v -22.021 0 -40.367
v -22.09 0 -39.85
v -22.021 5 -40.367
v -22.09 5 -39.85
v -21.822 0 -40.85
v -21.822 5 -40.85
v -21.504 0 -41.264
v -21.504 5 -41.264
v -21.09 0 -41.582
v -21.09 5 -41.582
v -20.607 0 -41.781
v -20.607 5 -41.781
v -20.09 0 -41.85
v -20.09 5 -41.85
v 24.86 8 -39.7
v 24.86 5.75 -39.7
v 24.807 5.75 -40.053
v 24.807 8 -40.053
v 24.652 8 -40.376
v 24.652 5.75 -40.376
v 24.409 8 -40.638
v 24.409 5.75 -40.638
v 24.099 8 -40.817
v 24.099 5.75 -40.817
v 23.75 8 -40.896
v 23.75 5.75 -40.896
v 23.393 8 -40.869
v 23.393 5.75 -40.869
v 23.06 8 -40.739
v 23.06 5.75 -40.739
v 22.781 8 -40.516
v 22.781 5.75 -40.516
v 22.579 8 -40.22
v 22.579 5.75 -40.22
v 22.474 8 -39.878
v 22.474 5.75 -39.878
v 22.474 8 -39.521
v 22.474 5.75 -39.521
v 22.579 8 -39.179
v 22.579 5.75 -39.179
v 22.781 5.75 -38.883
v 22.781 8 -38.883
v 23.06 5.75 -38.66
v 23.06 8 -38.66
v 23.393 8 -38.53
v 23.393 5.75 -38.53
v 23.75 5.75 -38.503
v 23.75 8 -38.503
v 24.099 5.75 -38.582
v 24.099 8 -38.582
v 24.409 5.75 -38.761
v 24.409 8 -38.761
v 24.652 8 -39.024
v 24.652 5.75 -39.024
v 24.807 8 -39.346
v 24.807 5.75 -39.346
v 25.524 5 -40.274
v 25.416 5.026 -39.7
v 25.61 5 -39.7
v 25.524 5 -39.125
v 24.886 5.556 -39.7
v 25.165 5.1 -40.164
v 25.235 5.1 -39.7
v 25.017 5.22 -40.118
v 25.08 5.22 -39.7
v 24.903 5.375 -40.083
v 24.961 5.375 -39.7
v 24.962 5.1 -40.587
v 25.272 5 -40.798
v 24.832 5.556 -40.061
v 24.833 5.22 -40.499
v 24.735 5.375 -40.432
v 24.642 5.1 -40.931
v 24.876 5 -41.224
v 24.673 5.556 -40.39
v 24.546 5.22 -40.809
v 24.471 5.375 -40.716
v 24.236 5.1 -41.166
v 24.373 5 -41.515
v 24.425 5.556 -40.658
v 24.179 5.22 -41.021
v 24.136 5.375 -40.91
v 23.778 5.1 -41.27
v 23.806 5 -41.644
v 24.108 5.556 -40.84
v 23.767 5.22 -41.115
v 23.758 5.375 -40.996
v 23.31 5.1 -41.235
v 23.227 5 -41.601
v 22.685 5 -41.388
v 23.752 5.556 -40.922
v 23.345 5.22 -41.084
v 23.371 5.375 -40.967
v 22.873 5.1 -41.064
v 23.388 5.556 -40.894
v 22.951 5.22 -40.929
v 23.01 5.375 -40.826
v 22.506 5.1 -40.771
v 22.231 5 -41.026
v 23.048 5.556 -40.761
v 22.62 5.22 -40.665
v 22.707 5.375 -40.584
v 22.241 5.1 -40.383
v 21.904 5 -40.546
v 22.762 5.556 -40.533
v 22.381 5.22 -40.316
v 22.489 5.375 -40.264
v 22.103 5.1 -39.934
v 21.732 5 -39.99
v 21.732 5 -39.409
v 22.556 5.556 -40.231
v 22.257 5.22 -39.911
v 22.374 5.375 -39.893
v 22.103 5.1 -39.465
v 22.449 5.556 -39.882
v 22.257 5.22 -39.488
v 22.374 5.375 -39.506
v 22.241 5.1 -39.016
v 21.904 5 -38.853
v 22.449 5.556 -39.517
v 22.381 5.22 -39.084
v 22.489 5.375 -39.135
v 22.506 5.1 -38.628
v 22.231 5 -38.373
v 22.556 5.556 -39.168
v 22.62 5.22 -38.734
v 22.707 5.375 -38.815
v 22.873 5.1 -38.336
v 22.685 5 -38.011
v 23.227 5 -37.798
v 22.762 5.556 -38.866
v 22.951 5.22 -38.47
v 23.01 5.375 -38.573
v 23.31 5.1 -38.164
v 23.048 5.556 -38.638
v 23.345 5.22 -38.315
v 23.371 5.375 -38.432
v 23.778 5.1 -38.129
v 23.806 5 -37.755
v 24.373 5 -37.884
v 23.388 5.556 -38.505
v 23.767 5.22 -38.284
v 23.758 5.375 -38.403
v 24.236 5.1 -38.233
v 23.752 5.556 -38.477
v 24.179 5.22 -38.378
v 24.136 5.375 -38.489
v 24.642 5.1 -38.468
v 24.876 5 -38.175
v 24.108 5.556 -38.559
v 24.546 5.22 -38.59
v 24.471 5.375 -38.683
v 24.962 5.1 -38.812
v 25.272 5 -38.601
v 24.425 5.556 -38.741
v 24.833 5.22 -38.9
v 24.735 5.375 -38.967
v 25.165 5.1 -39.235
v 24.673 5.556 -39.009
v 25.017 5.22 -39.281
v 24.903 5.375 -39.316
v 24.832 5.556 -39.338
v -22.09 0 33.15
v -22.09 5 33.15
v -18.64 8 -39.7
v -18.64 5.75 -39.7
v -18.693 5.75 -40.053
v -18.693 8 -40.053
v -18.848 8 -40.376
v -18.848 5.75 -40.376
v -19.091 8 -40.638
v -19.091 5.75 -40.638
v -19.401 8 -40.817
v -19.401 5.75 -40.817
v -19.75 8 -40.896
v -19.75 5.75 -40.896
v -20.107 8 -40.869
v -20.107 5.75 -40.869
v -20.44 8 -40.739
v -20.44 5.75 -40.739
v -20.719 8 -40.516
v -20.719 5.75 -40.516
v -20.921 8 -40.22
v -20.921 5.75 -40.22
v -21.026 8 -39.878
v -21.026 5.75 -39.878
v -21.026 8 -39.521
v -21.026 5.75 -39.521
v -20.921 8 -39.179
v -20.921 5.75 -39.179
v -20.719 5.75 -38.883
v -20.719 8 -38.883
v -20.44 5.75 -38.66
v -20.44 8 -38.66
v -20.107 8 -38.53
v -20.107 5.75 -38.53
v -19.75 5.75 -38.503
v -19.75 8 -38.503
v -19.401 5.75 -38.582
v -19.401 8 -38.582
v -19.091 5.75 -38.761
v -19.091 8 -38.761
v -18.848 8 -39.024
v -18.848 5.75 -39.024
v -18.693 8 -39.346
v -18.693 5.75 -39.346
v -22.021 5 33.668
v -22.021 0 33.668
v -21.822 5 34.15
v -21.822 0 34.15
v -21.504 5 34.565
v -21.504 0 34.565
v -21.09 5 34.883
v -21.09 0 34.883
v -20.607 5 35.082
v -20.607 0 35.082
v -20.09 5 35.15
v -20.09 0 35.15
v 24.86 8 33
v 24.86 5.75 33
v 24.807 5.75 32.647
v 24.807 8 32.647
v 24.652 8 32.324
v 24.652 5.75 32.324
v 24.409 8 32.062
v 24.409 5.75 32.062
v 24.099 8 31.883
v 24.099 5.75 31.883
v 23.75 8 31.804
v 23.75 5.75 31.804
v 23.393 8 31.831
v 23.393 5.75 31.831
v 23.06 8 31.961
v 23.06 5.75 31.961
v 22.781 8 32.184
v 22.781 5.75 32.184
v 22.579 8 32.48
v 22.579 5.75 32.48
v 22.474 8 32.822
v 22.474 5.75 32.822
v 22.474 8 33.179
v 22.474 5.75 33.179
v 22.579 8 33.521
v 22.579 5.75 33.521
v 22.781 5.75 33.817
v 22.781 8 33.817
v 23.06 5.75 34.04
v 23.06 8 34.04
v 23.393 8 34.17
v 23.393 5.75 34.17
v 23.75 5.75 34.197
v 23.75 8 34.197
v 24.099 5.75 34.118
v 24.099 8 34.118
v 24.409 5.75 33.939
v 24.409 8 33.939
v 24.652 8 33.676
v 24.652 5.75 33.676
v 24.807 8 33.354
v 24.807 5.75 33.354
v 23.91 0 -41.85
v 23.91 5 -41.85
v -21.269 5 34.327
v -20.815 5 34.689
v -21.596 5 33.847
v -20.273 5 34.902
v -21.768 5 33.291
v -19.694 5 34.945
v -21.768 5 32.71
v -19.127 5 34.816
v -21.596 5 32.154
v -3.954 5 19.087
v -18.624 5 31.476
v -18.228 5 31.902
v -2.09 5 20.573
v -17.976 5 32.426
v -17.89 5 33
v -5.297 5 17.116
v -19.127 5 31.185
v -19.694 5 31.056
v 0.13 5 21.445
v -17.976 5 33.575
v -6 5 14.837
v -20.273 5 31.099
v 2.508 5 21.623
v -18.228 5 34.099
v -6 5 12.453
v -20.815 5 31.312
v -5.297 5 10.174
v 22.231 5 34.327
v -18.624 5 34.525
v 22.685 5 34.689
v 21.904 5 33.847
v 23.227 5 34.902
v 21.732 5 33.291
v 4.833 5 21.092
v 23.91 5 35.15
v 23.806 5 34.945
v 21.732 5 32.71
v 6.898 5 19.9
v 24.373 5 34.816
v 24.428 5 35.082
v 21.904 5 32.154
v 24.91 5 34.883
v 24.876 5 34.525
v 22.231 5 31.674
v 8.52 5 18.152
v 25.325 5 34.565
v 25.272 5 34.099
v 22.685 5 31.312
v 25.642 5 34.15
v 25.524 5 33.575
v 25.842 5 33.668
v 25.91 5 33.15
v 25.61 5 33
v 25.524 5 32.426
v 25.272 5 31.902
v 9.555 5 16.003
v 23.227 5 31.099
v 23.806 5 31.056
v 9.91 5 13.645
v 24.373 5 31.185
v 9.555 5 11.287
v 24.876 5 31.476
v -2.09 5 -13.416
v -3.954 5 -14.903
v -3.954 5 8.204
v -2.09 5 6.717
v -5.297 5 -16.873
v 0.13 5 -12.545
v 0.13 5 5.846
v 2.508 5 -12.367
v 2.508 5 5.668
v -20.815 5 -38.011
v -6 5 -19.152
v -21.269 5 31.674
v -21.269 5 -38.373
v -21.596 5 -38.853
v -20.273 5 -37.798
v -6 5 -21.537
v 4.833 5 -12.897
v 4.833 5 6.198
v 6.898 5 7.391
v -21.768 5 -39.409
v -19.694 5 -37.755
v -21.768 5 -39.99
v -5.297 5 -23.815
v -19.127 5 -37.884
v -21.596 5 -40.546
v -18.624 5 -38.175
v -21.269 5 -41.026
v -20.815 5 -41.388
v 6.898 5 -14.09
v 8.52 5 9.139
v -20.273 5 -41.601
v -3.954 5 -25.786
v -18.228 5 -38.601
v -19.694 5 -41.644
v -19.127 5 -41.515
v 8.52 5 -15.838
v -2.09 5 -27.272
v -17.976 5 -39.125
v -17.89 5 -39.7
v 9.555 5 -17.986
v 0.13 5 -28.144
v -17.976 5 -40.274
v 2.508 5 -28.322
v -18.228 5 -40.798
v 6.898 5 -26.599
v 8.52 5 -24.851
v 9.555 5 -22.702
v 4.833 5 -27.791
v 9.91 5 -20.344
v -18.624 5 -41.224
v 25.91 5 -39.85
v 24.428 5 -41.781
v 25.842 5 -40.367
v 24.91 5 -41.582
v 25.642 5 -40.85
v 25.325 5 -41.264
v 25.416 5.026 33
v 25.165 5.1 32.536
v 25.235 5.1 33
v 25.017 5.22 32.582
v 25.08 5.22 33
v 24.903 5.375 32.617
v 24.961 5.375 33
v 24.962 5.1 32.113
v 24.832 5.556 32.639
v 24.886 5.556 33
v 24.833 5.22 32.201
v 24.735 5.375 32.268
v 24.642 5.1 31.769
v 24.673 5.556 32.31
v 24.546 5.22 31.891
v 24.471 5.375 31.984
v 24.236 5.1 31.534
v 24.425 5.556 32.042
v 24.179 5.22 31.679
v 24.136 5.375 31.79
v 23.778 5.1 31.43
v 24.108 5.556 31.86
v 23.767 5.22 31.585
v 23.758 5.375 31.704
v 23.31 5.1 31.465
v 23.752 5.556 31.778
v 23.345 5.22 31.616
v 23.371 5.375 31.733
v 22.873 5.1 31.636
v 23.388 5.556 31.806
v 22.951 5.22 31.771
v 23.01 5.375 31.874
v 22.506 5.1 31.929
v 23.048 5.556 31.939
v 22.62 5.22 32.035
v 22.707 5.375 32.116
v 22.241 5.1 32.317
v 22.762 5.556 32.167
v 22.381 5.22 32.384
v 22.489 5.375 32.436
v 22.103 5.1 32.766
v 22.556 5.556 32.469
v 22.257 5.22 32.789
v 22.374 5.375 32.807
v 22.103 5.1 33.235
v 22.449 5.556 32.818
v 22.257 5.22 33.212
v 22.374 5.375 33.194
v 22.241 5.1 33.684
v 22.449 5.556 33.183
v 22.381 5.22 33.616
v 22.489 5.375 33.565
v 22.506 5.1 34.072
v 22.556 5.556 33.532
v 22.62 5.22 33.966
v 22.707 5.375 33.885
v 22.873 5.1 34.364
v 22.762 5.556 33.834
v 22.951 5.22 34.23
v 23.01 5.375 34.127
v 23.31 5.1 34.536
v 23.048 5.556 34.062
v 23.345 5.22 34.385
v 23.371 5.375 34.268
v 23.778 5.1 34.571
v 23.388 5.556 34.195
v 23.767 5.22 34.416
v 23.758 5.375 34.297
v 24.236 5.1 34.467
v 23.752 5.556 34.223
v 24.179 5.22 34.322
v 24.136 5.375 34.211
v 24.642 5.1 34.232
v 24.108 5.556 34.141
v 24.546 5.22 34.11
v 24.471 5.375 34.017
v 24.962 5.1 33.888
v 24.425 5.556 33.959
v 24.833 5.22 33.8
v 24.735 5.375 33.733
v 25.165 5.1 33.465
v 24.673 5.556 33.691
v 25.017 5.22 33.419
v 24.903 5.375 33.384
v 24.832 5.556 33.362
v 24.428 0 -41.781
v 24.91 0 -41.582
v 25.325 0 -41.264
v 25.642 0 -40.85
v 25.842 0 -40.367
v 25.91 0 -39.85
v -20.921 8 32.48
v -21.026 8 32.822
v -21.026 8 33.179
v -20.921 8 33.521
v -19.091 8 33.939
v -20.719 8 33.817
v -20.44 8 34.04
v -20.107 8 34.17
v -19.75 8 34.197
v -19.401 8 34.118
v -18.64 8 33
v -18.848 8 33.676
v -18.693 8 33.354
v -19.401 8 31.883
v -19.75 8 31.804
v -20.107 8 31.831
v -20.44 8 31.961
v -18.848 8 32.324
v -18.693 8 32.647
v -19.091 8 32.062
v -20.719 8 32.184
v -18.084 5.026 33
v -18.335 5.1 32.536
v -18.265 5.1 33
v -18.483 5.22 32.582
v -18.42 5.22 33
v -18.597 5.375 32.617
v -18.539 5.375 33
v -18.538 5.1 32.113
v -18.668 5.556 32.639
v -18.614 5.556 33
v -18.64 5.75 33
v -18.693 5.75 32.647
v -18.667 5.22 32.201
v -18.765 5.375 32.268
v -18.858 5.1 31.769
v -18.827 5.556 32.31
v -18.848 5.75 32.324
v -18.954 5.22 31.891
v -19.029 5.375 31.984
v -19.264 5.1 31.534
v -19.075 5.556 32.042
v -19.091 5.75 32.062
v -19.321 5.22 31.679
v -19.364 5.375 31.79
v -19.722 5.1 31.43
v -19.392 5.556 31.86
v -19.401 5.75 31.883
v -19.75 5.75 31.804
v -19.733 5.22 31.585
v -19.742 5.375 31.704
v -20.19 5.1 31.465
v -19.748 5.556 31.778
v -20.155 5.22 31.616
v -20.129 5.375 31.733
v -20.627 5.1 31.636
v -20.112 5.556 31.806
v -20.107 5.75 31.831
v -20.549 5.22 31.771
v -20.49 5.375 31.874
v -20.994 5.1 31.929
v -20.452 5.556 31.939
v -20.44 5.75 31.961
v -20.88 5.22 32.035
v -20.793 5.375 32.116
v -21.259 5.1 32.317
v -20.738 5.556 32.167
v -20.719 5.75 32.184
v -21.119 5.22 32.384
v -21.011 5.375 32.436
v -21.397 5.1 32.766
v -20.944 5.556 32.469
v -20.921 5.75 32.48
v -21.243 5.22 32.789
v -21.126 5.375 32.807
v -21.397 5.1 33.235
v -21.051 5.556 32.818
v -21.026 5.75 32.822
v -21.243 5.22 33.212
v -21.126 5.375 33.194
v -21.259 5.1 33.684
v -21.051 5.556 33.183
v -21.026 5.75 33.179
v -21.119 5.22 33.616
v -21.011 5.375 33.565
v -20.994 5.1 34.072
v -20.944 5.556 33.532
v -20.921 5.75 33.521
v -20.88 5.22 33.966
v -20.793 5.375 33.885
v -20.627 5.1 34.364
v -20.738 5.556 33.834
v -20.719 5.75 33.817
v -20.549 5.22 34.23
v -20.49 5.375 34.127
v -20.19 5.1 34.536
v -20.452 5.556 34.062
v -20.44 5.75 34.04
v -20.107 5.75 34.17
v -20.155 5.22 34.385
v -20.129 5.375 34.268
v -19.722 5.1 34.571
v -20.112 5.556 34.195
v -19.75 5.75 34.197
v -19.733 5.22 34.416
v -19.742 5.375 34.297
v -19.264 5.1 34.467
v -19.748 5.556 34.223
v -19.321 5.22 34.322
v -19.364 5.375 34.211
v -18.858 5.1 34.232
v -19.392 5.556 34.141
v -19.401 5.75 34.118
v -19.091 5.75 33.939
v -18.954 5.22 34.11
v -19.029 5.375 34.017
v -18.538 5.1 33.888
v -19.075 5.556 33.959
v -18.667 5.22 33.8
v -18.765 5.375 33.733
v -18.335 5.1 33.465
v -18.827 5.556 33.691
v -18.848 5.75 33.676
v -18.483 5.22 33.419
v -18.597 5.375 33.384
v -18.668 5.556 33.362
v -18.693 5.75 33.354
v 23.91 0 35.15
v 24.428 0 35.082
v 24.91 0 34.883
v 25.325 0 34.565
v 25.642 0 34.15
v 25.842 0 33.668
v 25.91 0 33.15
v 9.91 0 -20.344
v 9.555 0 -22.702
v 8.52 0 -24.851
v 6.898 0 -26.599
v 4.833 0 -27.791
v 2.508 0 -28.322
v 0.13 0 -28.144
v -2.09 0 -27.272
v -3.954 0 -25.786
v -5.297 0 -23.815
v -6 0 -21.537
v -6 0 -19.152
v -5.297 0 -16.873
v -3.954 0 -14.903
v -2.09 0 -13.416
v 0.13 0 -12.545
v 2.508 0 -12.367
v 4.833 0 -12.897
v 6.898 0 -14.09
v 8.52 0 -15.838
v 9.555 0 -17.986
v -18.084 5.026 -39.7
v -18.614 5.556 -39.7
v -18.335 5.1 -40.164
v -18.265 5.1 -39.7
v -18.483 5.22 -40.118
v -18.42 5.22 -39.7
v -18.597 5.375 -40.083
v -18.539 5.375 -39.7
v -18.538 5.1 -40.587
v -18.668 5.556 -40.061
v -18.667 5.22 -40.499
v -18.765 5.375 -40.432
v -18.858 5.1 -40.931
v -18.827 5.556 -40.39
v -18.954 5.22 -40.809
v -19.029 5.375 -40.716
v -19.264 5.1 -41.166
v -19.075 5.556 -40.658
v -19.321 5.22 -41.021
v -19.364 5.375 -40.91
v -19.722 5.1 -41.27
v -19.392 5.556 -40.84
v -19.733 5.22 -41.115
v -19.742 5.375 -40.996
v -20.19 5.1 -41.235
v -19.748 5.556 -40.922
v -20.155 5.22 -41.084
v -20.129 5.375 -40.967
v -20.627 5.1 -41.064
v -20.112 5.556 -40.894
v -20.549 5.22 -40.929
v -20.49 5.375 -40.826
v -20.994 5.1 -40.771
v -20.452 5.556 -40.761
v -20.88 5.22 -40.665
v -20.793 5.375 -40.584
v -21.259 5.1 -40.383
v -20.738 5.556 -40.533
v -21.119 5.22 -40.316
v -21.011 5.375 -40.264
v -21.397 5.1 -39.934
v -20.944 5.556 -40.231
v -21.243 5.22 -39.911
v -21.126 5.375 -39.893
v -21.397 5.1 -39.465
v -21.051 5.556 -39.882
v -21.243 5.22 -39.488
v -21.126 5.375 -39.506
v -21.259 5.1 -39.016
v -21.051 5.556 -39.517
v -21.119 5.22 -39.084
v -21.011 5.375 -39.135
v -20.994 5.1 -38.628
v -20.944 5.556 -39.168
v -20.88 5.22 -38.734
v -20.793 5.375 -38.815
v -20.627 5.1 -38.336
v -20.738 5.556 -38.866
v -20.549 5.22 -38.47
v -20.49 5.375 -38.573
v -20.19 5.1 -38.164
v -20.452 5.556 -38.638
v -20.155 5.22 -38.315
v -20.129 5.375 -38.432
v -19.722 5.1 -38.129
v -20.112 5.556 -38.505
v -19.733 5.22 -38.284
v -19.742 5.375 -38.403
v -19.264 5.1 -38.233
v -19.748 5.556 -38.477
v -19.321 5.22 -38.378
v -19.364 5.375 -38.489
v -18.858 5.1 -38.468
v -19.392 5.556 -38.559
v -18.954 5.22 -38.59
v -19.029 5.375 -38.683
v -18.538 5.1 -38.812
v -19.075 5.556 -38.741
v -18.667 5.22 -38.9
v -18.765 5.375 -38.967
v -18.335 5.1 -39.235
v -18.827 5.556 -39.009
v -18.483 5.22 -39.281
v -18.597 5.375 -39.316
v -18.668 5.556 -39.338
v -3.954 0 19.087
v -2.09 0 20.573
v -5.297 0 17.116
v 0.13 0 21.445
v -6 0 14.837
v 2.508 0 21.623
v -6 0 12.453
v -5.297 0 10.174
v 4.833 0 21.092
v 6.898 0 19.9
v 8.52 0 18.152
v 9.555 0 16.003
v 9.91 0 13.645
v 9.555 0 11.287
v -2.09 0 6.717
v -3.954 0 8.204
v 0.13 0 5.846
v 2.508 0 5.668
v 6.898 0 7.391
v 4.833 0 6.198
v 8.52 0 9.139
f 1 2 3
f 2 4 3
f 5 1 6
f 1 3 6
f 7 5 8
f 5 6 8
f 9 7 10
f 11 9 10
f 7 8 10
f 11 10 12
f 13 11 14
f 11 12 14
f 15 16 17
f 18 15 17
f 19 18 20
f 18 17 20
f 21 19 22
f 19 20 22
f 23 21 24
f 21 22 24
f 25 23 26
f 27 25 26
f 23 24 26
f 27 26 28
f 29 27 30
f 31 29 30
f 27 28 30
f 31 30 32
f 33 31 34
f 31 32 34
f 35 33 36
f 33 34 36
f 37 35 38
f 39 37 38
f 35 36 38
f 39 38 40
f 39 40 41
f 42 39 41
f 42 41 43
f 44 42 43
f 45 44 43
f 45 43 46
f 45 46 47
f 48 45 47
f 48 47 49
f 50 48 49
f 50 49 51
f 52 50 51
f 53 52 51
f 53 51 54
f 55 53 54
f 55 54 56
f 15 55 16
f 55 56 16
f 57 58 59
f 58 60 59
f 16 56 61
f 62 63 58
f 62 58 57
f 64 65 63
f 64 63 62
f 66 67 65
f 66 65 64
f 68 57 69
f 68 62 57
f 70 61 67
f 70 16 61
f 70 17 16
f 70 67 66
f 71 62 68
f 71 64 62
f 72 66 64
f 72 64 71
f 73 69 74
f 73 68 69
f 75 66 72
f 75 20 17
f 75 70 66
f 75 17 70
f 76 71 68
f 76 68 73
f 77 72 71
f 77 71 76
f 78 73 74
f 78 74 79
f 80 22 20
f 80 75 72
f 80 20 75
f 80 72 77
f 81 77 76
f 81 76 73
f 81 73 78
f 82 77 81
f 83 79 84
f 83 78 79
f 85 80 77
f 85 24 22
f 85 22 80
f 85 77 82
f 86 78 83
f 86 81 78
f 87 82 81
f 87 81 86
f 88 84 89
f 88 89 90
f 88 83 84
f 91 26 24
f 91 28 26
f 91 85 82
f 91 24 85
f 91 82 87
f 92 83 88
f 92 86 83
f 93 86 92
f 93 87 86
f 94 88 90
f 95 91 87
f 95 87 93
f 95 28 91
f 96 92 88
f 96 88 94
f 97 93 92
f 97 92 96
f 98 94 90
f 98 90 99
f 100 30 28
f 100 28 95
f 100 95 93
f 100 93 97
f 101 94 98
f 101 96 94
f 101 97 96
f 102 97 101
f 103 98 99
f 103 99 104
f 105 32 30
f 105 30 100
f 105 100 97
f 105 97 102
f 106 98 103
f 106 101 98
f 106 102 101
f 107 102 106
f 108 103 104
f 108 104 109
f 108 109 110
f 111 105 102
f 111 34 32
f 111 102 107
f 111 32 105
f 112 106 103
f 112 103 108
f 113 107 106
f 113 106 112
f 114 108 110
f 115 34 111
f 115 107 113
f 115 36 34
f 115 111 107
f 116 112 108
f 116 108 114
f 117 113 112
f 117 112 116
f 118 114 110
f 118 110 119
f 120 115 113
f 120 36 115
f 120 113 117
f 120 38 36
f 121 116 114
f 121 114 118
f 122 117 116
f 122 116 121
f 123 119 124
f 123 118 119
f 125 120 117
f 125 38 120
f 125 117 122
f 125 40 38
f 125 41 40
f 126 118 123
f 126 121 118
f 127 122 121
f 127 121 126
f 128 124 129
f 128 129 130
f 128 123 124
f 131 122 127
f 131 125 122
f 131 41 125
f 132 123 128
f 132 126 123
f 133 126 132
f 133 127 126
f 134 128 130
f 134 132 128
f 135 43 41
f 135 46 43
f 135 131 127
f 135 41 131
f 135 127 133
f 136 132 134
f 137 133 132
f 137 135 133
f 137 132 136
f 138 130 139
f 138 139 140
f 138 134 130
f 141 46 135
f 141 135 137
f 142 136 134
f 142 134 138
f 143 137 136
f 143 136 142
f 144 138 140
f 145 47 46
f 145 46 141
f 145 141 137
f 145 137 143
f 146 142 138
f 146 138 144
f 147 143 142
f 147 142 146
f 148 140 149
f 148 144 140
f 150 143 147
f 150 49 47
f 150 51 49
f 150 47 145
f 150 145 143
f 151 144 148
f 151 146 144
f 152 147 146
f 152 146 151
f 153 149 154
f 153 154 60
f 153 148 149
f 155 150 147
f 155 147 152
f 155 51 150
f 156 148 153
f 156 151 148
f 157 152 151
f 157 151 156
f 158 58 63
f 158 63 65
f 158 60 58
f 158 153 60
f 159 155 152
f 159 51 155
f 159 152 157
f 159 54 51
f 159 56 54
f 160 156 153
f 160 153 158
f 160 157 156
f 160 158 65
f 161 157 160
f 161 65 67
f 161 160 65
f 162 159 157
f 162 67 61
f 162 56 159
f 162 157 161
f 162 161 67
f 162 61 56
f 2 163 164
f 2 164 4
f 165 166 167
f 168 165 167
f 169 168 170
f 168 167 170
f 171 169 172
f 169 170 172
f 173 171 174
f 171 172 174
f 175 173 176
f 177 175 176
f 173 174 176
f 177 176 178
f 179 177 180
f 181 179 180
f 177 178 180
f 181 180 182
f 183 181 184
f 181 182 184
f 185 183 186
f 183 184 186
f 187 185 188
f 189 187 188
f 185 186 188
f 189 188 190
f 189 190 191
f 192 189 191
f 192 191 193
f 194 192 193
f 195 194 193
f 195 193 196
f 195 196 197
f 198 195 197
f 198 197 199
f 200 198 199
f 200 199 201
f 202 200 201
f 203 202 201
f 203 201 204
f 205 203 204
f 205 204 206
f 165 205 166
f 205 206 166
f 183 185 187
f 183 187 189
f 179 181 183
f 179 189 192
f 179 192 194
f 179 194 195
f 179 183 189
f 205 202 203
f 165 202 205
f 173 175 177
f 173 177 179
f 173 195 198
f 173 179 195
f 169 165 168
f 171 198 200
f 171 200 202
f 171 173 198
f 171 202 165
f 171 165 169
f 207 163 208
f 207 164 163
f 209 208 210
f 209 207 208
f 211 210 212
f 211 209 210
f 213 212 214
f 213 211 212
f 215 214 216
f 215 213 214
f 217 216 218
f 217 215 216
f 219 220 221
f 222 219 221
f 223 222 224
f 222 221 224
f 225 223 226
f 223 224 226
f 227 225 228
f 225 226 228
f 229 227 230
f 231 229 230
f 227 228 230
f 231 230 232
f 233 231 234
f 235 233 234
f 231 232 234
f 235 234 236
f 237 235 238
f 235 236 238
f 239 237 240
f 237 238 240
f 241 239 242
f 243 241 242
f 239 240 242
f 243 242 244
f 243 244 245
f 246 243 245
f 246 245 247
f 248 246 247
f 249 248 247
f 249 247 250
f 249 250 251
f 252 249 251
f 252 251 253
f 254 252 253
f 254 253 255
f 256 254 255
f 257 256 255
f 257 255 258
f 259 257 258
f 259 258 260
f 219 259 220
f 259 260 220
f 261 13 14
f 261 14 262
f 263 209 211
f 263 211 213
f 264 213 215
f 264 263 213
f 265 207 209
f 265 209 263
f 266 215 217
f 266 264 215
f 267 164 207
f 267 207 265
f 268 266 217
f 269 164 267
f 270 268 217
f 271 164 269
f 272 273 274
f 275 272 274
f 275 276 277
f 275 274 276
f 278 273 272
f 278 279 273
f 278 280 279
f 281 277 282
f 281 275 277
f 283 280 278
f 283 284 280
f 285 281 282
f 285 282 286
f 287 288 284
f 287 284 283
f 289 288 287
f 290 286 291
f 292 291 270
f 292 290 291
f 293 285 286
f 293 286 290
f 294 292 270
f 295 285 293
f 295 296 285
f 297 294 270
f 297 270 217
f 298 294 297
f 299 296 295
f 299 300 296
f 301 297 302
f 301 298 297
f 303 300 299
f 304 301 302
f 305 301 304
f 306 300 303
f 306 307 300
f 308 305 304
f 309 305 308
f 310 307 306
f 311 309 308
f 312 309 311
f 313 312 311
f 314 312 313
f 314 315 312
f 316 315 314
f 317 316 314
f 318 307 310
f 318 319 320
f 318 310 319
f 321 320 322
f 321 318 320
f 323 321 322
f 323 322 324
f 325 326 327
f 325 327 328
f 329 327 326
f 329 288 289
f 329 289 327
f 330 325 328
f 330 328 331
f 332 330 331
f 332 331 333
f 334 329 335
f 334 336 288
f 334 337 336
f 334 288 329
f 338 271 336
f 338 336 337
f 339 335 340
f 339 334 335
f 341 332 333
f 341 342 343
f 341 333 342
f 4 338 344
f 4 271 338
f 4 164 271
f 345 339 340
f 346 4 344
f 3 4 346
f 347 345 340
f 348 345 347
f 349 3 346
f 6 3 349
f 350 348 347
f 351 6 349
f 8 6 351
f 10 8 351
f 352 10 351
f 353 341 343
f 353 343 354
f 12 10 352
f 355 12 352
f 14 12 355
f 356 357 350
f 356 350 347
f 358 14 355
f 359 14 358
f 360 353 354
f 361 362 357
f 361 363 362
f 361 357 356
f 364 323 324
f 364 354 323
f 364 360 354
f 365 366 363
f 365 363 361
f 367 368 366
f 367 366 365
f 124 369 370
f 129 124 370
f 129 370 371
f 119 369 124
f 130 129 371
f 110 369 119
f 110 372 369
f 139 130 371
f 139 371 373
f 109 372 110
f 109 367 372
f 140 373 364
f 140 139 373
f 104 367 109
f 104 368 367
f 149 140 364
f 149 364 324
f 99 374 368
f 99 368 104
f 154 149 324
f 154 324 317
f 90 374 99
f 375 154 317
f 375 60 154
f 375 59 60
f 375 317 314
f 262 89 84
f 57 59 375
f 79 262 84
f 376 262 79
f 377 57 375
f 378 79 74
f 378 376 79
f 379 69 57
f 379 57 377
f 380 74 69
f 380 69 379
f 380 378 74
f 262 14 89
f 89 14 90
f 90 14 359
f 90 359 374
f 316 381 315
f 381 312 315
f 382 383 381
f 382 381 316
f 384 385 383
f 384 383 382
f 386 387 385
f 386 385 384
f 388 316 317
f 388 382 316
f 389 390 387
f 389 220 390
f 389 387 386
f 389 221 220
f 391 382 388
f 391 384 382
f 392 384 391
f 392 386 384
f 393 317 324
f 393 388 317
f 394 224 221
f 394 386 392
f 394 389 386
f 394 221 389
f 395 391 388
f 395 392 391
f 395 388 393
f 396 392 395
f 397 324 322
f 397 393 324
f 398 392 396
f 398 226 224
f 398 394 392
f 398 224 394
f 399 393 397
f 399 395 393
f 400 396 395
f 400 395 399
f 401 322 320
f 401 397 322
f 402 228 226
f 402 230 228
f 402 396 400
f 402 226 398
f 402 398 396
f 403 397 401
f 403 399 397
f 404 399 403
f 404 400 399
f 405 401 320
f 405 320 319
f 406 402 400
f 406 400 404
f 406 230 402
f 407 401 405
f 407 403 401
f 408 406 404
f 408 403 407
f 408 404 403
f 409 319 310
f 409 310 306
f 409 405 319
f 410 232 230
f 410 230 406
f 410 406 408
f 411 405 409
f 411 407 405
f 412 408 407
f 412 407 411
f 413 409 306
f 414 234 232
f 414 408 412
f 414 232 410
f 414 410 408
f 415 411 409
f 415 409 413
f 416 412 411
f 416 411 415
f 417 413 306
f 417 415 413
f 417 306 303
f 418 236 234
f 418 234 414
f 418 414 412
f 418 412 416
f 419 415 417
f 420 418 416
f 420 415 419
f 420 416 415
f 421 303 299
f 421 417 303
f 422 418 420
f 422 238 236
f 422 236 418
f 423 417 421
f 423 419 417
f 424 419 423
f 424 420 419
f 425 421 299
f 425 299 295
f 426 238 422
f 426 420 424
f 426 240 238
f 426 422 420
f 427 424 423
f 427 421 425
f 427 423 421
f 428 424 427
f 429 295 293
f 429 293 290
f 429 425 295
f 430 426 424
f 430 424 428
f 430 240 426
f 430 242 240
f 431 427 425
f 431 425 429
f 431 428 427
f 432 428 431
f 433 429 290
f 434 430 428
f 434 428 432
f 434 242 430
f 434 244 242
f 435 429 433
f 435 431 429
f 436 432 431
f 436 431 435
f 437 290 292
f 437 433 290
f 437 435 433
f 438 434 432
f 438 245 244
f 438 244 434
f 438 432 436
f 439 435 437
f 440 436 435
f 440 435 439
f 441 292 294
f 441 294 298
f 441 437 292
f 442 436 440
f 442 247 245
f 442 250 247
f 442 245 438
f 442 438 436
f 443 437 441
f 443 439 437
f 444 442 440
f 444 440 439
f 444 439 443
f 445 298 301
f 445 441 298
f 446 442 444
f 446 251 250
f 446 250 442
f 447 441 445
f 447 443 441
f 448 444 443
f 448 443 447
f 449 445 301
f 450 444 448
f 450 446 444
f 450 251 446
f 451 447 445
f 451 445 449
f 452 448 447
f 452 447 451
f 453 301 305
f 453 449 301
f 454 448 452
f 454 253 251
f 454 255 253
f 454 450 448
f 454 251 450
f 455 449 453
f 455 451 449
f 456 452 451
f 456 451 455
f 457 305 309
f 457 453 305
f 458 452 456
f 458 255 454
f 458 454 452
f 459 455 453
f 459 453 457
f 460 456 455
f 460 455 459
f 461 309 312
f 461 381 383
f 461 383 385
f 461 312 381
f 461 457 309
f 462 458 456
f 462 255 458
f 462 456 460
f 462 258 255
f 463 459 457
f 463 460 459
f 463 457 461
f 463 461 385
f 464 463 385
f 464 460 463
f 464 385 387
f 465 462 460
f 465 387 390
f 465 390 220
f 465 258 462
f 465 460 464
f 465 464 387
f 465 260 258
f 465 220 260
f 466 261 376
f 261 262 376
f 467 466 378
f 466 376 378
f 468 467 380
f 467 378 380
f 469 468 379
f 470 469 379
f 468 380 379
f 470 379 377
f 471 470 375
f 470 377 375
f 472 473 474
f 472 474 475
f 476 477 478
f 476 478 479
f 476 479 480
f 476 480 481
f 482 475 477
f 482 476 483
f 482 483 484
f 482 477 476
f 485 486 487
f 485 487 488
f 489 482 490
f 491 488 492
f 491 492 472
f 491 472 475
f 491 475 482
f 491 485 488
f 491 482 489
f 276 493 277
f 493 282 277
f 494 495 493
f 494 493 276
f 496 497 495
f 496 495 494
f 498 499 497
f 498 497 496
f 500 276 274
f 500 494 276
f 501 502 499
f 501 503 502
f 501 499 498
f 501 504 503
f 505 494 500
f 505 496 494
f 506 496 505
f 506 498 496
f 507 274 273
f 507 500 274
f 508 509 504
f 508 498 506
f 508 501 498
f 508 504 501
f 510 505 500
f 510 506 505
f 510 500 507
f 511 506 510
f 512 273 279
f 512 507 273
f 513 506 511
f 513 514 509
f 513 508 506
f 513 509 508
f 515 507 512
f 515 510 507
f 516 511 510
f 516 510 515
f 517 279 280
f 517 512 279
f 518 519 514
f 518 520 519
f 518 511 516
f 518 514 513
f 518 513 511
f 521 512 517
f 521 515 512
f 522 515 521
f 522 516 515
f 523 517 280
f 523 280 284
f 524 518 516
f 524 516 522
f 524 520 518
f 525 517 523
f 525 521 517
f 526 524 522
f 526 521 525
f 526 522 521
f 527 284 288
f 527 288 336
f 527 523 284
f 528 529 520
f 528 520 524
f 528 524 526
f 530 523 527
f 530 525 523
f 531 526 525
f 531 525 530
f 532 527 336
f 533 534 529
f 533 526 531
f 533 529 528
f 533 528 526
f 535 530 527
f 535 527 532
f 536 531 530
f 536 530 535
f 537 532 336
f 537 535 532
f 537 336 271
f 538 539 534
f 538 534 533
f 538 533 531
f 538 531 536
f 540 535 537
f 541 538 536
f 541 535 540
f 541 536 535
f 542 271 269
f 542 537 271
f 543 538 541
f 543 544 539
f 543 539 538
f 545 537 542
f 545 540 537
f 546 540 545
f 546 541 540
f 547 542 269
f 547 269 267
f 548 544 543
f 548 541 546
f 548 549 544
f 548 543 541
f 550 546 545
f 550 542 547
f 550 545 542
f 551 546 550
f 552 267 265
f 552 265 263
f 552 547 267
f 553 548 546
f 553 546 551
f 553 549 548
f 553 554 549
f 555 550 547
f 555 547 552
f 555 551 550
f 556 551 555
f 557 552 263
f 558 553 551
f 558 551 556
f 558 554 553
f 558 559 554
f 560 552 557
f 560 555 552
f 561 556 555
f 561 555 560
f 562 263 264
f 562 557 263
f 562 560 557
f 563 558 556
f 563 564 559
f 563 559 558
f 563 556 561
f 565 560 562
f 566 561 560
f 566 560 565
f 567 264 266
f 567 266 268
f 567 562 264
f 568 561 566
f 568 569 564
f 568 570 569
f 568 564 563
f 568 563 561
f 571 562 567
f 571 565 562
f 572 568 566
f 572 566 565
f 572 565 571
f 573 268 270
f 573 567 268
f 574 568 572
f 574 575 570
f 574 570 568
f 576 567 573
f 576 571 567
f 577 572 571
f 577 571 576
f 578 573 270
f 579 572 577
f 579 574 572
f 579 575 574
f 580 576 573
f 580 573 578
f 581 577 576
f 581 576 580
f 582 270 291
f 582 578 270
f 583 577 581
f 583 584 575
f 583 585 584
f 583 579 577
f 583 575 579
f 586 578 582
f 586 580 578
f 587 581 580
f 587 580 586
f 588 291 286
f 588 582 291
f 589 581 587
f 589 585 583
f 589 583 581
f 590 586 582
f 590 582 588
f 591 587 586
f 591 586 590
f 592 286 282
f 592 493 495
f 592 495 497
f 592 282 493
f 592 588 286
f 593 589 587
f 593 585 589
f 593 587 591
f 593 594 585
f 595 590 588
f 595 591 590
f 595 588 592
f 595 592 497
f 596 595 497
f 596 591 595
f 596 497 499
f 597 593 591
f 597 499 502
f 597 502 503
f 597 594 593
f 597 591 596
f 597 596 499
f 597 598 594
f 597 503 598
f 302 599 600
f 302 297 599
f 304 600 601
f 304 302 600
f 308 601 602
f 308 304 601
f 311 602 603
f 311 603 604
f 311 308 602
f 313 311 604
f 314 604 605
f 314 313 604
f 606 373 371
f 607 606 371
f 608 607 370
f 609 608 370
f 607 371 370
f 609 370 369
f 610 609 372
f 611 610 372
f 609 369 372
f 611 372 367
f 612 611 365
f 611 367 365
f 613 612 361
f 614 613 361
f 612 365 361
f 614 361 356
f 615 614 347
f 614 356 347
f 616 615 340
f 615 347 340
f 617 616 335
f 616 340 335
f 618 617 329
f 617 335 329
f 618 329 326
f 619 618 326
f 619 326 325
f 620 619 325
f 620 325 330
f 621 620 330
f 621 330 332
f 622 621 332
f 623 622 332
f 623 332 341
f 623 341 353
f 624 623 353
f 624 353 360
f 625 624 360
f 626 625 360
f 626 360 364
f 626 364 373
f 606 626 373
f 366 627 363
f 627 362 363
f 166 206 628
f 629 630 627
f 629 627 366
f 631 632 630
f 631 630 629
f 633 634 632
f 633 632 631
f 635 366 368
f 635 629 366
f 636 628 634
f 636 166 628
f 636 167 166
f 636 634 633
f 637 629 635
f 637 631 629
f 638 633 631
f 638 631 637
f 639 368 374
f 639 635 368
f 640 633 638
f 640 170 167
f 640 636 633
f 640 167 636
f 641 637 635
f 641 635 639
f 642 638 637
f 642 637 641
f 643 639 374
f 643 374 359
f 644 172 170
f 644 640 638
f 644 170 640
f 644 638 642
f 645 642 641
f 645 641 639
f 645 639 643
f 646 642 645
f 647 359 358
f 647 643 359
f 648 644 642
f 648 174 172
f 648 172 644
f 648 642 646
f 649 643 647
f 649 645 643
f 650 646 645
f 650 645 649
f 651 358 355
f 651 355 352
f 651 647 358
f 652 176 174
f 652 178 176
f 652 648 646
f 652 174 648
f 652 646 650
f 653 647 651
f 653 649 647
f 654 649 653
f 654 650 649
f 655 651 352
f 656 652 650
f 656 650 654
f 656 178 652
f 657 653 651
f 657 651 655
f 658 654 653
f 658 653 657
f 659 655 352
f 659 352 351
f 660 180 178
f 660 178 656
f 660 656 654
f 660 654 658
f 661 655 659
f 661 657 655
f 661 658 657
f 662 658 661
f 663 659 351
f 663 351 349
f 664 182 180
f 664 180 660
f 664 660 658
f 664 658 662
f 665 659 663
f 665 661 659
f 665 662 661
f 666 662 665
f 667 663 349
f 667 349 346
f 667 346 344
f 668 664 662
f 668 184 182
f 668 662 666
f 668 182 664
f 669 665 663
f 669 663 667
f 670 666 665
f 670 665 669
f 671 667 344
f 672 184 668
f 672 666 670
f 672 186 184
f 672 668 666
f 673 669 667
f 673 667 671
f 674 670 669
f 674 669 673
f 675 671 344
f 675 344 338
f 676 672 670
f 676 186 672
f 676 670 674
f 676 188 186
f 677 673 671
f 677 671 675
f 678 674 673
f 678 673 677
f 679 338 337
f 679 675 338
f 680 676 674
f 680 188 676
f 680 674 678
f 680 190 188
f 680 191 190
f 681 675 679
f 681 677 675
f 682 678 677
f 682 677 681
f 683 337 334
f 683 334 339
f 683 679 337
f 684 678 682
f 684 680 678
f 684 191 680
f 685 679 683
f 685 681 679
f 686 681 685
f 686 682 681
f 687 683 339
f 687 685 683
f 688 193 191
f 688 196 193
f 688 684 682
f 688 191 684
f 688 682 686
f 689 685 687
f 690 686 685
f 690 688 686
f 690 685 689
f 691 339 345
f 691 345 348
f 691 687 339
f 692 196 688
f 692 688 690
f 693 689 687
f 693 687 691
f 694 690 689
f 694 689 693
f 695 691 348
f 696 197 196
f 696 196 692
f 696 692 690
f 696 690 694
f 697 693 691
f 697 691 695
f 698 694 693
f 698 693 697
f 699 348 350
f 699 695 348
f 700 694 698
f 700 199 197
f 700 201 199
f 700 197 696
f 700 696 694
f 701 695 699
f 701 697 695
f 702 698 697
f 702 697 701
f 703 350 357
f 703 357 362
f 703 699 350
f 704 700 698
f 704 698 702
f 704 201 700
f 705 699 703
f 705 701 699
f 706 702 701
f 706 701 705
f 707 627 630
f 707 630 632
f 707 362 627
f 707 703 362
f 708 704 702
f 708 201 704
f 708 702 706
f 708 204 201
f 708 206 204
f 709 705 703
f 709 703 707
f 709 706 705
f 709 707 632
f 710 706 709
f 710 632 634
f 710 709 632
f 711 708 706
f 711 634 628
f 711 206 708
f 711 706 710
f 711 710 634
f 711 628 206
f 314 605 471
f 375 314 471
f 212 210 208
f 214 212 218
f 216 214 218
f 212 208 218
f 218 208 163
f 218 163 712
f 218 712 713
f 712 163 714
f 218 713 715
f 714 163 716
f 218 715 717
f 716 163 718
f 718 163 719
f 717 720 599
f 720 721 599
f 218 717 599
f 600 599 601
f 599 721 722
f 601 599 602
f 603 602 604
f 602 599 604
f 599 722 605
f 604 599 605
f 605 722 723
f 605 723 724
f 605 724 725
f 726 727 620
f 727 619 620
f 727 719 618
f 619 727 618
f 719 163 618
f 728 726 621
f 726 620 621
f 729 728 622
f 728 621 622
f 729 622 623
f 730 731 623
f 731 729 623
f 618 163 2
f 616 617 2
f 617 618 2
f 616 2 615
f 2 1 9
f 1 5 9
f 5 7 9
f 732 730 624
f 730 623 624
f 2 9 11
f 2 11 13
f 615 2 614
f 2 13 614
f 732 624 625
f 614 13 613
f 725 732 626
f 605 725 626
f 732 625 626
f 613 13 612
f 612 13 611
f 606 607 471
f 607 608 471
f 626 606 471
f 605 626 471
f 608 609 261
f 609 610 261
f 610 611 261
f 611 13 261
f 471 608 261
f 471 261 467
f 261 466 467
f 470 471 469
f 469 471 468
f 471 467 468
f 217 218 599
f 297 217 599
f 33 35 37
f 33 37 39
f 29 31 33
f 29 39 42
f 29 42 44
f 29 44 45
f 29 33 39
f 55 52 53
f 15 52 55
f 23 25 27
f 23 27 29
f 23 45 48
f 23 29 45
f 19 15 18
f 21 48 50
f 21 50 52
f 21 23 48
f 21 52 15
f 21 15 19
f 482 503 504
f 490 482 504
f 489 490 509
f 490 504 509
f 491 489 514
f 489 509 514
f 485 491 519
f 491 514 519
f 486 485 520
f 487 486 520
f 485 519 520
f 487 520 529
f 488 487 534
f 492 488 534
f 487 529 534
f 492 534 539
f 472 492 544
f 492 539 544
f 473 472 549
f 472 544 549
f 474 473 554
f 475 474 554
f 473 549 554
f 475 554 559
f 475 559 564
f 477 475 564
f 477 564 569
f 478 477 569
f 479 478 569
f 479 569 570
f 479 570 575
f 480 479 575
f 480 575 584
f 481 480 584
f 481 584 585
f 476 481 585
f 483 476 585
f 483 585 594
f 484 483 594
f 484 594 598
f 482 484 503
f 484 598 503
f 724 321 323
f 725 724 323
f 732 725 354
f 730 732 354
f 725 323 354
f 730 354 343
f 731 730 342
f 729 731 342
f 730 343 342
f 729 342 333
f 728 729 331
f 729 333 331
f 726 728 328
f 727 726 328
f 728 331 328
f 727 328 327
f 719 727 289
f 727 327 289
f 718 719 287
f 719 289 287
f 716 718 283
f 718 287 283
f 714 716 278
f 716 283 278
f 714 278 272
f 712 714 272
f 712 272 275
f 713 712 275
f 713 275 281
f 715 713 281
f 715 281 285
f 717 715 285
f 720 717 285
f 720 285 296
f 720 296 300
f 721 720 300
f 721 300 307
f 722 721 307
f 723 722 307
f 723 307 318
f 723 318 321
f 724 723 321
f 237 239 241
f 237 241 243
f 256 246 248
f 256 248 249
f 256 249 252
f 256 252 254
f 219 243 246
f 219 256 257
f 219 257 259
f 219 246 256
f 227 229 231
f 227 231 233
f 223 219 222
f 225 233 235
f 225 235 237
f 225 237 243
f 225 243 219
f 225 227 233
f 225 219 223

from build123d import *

# Parameters (mm, degrees)
SKETCH1_W           = 48
SKETCH1_H           = 77
BOSS_EXTRUDE1_DEPTH = 5
SKETCH2_R           = 1.2
BOSS_EXTRUDE2_DEPTH = 3
FILLET1_R           = 0.75
FILLET2_R           = 2
SKETCH3_R           = 8
CUT_EXTRUDE1_DEPTH  = 6


with BuildPart() as part:
    # Sketch1 → Boss-Extrude1 (new body)
    with BuildSketch(Plane(origin=(0, 0, 0), x_dir=(1, 0, 0), z_dir=(0, 1, 0))):
        with Locations((1.910432331, 3.349532818)):
            Rectangle(SKETCH1_W, SKETCH1_H)
    extrude(amount=BOSS_EXTRUDE1_DEPTH)

    # Sketch2 → Boss-Extrude2 (add)
    with BuildSketch(Plane(origin=(0, 5, 0), x_dir=(1, 0, 0), z_dir=(0, 1, 0))):
        with Locations((-19.839567669, 39.699532818)):
            Circle(SKETCH2_R)
        with Locations((23.660432331, 39.699532818)):
            Circle(SKETCH2_R)
        with Locations((23.660432331, -33.000467182)):
            Circle(SKETCH2_R)
        with Locations((-19.839567669, -33.000467182)):
            Circle(SKETCH2_R)
    extrude(amount=BOSS_EXTRUDE2_DEPTH)

    # Fillet1
    fillet1_edges = [part.edges().sort_by_distance(p)[0] for p in [
        (-21.039567669, 5, -39.699532818),
        (22.460432331, 5, -39.699532818),
        (22.460432331, 5, 33.000467182),
        (-21.039567669, 5, 33.000467182),
    ]]
    fillet(fillet1_edges, radius=FILLET1_R)

    # Fillet2
    fillet2_edges = [part.edges().sort_by_distance(p)[0] for p in [
        (-22.089567669, 2.5, -41.849532818),
        (25.910432331, 2.5, -41.849532818),
        (25.910432331, 2.5, 35.150467182),
        (-22.089567669, 2.5, 35.150467182),
    ]]
    fillet(fillet2_edges, radius=FILLET2_R)

    # Sketch3 → Cut-Extrude1 (cut, through all)
    with BuildSketch(Plane(origin=(0, 5, 0), x_dir=(1, 0, 0), z_dir=(0, 1, 0))):
        with Locations((1.910432331, 20.344226446)):
            Circle(SKETCH3_R)
        with Locations((1.910432331, -13.645160811)):
            Circle(SKETCH3_R)
    extrude(amount=-CUT_EXTRUDE1_DEPTH, mode=Mode.SUBTRACT)


solid = part.part
